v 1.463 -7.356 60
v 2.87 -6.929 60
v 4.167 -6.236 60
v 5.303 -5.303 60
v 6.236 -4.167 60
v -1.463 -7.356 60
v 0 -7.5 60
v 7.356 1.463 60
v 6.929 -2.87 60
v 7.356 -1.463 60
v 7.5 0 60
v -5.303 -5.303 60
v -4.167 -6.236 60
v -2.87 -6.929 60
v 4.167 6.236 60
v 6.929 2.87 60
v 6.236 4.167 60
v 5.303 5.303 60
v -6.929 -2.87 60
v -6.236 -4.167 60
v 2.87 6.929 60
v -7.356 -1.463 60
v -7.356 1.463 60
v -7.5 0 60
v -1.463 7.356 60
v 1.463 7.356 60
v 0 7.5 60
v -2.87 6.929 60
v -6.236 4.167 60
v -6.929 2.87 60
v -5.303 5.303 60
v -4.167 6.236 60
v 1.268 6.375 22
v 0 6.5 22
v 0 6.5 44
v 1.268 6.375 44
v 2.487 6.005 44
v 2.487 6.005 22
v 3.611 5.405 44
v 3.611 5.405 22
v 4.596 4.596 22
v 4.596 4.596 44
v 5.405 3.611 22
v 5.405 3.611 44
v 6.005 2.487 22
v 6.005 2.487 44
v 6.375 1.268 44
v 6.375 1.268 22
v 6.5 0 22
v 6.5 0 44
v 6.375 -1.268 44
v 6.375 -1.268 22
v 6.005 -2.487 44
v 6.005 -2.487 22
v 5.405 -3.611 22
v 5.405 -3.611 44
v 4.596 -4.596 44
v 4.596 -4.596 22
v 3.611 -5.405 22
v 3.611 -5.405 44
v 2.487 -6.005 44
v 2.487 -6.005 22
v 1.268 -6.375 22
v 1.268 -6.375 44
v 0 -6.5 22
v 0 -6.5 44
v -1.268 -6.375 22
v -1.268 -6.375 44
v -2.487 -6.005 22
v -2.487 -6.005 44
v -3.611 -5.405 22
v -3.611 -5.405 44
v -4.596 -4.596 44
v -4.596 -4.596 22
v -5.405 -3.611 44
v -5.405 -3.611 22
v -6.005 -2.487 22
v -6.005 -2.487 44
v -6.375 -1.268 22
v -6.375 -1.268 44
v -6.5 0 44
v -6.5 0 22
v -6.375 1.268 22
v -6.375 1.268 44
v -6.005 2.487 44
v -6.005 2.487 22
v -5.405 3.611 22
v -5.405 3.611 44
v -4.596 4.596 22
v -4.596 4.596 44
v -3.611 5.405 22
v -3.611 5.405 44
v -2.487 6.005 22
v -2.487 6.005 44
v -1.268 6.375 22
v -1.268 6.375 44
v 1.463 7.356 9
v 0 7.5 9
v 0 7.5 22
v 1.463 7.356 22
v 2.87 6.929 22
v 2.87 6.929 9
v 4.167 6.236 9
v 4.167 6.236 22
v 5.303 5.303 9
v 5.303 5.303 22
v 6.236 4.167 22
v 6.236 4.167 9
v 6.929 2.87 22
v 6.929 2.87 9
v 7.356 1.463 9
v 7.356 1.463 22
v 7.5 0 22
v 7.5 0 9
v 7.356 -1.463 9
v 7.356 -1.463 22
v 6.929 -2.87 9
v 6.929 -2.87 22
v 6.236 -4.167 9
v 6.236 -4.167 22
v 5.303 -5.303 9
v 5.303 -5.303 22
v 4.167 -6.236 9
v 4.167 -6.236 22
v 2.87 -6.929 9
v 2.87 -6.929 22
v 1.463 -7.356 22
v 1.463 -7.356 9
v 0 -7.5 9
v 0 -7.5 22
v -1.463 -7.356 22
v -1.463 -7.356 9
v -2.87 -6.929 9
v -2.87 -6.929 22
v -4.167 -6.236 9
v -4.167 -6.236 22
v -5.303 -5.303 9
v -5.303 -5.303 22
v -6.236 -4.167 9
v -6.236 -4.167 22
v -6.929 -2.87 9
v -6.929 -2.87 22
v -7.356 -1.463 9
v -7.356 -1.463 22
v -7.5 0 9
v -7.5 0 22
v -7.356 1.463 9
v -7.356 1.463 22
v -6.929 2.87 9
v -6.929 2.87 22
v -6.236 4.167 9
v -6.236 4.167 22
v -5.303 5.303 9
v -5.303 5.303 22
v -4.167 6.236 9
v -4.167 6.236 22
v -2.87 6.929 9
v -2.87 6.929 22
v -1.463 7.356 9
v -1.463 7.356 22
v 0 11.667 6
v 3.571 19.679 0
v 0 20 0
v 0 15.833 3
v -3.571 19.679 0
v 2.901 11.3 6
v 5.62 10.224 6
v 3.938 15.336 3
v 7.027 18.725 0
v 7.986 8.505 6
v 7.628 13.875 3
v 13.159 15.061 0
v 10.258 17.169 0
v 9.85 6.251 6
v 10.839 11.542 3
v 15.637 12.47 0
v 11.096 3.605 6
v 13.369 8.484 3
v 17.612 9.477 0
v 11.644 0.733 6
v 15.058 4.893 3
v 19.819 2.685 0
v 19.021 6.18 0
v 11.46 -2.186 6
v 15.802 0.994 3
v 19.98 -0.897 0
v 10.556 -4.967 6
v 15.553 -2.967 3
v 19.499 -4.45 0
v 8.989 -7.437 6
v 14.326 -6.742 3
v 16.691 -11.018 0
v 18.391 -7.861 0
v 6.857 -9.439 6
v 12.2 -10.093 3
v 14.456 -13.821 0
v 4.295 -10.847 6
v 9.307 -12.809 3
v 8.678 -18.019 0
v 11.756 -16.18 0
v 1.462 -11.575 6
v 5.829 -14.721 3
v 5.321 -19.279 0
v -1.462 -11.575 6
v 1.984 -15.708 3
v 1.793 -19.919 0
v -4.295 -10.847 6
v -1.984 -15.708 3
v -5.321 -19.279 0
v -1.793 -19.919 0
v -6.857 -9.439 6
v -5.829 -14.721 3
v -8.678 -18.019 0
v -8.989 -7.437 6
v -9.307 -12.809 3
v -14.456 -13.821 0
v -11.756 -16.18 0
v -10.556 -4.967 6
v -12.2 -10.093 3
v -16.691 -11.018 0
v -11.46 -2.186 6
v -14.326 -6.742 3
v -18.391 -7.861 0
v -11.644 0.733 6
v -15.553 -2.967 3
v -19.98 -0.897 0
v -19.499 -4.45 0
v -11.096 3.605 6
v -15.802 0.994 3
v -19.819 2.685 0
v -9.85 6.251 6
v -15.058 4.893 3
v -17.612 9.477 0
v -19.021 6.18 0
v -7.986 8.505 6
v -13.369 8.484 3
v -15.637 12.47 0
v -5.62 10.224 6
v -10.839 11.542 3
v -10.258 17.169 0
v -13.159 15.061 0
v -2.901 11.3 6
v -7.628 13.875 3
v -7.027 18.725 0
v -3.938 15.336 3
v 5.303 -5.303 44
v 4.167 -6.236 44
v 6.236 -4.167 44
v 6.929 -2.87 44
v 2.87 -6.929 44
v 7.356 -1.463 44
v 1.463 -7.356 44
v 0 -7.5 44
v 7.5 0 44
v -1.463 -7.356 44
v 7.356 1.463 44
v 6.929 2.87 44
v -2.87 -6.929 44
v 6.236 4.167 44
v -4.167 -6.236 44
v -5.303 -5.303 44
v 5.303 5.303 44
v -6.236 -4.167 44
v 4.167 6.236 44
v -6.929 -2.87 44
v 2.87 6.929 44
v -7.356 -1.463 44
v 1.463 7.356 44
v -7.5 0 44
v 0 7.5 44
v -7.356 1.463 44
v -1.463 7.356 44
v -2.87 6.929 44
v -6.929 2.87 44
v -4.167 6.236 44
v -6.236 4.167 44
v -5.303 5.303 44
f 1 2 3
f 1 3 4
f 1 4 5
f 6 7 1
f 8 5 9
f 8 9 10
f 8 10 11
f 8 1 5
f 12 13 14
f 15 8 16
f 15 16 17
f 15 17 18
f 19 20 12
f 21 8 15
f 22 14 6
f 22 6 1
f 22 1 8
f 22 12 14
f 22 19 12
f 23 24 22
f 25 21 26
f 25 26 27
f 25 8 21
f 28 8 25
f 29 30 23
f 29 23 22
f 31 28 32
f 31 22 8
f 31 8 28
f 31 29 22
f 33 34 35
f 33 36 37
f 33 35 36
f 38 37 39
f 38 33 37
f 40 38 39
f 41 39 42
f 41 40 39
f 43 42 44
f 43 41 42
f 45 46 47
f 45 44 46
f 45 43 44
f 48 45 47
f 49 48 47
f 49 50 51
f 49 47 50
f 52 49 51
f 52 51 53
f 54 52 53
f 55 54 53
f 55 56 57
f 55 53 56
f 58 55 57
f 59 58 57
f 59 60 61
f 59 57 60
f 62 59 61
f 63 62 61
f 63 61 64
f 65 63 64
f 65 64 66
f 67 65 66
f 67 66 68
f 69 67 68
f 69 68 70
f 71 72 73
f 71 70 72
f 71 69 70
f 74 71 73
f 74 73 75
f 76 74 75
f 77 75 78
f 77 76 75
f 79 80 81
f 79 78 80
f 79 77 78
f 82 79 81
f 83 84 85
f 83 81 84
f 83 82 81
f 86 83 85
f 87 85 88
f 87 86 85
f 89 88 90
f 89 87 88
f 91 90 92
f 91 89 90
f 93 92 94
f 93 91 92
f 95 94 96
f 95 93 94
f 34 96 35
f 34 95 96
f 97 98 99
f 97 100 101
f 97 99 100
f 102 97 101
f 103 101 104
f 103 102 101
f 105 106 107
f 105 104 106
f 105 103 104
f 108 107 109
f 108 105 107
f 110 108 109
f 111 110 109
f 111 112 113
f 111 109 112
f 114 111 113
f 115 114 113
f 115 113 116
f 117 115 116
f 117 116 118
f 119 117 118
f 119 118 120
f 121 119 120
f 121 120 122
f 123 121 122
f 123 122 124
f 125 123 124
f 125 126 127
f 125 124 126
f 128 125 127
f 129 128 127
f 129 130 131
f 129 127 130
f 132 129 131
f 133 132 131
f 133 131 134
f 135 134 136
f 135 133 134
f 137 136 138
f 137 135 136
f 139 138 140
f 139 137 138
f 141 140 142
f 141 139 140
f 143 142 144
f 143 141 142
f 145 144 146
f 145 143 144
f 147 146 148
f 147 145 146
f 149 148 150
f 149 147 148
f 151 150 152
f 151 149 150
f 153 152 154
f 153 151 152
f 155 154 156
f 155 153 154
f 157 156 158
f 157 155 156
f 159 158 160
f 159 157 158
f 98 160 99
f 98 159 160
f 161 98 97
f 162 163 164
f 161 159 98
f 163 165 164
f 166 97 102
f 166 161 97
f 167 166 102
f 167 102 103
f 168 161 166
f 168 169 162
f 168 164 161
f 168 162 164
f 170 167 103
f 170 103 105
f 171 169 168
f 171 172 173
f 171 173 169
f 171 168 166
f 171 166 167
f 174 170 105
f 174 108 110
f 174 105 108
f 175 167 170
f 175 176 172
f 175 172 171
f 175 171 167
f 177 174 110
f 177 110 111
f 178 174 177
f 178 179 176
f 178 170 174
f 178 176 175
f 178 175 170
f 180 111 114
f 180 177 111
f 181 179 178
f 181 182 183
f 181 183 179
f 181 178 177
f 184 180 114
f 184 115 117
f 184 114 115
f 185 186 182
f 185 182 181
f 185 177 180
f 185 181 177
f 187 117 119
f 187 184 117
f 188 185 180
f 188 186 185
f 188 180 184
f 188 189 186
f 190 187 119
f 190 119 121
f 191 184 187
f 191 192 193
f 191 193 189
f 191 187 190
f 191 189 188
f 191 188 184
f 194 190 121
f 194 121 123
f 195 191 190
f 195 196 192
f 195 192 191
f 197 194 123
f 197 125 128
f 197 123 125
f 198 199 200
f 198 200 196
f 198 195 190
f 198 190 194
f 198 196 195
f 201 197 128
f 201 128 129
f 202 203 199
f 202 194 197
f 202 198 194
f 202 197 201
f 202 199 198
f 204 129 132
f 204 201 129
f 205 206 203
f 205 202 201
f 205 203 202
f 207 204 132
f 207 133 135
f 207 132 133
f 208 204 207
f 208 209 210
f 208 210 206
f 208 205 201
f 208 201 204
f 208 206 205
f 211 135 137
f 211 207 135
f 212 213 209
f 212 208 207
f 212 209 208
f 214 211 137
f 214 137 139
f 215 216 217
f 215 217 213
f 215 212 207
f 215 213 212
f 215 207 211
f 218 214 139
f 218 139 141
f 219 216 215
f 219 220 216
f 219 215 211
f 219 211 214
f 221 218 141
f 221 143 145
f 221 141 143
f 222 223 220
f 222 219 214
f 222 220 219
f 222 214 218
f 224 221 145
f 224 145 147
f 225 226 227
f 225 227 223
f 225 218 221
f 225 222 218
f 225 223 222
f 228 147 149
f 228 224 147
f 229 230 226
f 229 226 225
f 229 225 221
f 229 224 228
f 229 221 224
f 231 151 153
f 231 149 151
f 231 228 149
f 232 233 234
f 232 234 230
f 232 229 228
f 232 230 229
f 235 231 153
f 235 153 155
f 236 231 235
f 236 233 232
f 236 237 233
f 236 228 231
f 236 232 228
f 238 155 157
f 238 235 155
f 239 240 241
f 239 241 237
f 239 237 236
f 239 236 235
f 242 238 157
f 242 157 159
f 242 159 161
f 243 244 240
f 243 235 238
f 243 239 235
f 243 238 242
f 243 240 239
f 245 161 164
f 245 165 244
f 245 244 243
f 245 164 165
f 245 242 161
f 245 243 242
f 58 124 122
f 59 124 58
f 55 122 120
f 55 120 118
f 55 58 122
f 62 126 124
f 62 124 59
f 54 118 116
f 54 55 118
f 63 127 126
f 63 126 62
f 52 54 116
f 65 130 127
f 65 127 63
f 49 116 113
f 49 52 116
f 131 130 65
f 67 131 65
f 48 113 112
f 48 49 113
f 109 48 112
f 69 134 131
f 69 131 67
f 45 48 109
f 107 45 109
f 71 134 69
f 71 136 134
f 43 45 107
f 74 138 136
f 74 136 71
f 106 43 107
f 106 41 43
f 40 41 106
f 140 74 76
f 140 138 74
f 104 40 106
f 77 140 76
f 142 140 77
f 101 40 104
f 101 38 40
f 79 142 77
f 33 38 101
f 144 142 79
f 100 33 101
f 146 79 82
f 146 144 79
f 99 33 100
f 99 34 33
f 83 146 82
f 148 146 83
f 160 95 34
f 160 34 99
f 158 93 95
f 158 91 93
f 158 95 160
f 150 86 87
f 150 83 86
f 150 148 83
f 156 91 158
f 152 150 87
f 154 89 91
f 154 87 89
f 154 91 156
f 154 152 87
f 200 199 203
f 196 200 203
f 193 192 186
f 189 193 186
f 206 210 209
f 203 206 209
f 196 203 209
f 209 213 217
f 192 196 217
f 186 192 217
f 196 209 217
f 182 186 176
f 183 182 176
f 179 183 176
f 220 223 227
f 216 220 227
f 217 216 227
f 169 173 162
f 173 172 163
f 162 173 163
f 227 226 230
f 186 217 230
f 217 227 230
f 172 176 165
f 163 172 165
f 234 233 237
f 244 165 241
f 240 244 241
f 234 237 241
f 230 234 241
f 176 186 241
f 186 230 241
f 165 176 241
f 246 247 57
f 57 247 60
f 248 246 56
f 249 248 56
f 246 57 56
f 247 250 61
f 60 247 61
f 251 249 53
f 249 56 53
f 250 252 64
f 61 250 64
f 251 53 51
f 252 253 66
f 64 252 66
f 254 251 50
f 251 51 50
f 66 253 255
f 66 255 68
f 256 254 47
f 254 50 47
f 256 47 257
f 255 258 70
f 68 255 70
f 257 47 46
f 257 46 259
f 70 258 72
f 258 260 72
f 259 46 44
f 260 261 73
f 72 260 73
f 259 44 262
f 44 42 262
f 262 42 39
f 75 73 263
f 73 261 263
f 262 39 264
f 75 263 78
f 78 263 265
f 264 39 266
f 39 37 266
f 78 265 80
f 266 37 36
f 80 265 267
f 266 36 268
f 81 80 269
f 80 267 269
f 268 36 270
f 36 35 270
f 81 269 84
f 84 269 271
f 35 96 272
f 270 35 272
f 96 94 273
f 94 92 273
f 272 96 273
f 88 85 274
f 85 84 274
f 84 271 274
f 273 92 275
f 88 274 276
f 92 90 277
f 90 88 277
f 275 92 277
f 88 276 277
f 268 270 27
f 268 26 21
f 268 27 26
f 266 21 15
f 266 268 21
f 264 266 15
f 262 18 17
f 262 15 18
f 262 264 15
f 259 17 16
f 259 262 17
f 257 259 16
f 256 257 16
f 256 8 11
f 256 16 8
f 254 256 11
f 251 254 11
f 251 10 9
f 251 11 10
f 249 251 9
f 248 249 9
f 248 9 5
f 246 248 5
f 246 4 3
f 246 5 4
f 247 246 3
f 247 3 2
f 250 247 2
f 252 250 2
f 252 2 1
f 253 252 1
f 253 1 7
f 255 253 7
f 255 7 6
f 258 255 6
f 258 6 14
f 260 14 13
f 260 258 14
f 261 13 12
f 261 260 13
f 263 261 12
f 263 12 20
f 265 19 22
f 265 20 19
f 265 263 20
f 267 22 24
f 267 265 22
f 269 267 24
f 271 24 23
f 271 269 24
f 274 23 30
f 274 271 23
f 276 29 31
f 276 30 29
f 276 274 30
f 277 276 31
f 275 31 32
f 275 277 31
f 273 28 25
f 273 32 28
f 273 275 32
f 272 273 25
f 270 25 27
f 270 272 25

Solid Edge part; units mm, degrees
sketch "Sketch1" plane through (0, 0, 0) normal (1, 0, 0) x (0, 1, 0)
  line L0 (7.5, 22) -> (7.5, 9)
  line L1 (7.5, 9) -> (20, 0)
  line L2 (20, 0) -> (0, 0)
  line L3 (0, 0) -> (0, 22)
  line L4 (0, 22) -> (0, 60)
  line L5 (0, 60) -> (7.5, 60)
  line L6 (7.5, 60) -> (7.5, 44)
  line L7 (7.5, 44) -> (6.5, 44)
  line L8 (6.5, 44) -> (6.5, 22)
  line L9 (7.5, 22) -> (6.5, 22)
  dimension "D1" = 20
  dimension "D2" = 9
  dimension "D3" = 22
  dimension "D4" = 1
  dimension "D5" = 44
  dimension "D6" = 60
revolve "RevolvedProtrusion1" add sketch "Sketch1" angle 360 about axis through (0, 0, 0) along (0, 0, 1)
